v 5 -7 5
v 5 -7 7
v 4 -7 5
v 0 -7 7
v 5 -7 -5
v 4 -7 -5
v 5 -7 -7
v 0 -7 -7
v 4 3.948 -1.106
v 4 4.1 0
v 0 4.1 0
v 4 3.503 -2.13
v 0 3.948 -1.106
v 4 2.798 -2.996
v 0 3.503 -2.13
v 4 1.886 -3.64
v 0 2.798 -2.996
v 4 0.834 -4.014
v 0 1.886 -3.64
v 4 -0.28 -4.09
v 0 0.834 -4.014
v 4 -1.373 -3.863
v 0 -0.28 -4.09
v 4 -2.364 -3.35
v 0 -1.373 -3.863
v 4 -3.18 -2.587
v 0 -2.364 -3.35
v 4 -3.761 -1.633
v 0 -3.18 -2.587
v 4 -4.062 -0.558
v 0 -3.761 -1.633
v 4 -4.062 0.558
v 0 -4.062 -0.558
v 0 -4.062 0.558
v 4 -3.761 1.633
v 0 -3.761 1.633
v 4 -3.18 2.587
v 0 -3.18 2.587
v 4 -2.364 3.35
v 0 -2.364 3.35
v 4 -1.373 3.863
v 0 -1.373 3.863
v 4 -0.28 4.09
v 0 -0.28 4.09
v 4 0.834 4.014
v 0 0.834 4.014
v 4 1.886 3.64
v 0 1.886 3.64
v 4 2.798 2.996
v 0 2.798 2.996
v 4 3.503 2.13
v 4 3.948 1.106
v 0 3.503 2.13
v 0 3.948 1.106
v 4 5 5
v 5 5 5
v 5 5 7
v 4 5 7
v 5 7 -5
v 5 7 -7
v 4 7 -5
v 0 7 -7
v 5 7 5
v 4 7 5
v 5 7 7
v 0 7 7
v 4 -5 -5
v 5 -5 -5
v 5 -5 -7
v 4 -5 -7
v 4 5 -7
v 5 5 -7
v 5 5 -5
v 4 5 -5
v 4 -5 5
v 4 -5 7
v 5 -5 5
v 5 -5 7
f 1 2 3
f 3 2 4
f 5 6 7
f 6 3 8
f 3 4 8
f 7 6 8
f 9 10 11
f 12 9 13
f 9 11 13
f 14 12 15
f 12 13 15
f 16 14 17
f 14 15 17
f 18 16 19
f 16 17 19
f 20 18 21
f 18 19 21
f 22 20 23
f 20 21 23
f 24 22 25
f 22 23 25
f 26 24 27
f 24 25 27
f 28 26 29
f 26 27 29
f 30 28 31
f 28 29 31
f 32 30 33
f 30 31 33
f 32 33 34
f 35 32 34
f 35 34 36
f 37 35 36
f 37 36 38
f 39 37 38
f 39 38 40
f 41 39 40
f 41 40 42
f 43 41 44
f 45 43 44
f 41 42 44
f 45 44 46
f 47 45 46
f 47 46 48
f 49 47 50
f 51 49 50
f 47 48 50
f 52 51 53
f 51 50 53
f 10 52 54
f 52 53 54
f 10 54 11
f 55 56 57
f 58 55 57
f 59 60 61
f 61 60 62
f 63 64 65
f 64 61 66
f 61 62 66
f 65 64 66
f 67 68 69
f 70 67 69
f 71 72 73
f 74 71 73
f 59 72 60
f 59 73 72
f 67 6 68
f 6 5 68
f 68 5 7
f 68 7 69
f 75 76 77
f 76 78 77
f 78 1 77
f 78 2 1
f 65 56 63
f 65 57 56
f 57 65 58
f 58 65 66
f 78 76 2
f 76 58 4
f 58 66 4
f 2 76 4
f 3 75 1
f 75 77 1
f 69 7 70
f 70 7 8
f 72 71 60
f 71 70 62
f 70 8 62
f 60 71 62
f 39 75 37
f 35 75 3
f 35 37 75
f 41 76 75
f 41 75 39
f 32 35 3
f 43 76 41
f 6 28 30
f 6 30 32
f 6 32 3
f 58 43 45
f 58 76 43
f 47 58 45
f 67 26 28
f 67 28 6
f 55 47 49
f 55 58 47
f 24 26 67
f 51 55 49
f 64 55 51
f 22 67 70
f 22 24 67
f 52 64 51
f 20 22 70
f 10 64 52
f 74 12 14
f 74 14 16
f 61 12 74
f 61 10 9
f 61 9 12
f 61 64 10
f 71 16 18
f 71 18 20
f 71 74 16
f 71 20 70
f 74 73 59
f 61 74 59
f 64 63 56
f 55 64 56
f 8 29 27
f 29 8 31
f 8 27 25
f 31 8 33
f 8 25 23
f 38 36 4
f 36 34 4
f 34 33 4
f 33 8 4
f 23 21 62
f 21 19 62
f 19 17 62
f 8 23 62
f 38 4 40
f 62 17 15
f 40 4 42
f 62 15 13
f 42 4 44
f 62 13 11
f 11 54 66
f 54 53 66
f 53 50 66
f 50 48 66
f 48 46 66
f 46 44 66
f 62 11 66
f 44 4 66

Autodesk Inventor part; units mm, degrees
sketch "Skizze_1" plane through (0, 0, 0) normal (1, 0, 0) x (0, 1, 0)
  line L0 (-7, 7) -> (-7, -7)
  line L1 (-7, -7) -> (7, -7)
  line L2 (7, -7) -> (7, 7)
  line L3 (7, 7) -> (-7, 7)
  circle A0 centre (0, 0) radius 4.1
extrude "Extrusion1" add sketch "Skizze_1" along normal blind 5
sketch "Skizze_2" plane through (5, 0, 0) normal (1, 0, 0) x (0, 0, -1)
  line L0 (-7, 5) -> (-7, -5)
  line L1 (-7, -5) -> (-5, -5)
  line L2 (-5, -5) -> (-5, -7)
  line L3 (-5, -7) -> (5, -7)
  line L4 (5, -7) -> (5, -5)
  line L5 (5, -5) -> (7, -5)
  line L6 (7, -5) -> (7, 5)
  line L7 (7, 5) -> (5, 5)
  line L8 (5, 5) -> (5, 7)
  line L9 (5, 7) -> (-5, 7)
  line L10 (-5, 7) -> (-5, 5)
  line L11 (-5, 5) -> (-7, 5)
extrude "Extrusion2" cut sketch "Skizze_2" against normal blind 1
ref_plane "GUS_4502_1_XY" through (0, 0, 0) normal (1, 0, 0) x (0, 0, -1)
ref_plane "GUS_4502_1_YZ" through (0, 0, 0) normal (0, 0, -1) x (0, 1, 0)
ref_plane "GUS_4502_1_ZX" through (0, 0, 0) normal (0, 1, 0) x (1, 0, 0)
properties part number "Robotunits GUS_4502"
